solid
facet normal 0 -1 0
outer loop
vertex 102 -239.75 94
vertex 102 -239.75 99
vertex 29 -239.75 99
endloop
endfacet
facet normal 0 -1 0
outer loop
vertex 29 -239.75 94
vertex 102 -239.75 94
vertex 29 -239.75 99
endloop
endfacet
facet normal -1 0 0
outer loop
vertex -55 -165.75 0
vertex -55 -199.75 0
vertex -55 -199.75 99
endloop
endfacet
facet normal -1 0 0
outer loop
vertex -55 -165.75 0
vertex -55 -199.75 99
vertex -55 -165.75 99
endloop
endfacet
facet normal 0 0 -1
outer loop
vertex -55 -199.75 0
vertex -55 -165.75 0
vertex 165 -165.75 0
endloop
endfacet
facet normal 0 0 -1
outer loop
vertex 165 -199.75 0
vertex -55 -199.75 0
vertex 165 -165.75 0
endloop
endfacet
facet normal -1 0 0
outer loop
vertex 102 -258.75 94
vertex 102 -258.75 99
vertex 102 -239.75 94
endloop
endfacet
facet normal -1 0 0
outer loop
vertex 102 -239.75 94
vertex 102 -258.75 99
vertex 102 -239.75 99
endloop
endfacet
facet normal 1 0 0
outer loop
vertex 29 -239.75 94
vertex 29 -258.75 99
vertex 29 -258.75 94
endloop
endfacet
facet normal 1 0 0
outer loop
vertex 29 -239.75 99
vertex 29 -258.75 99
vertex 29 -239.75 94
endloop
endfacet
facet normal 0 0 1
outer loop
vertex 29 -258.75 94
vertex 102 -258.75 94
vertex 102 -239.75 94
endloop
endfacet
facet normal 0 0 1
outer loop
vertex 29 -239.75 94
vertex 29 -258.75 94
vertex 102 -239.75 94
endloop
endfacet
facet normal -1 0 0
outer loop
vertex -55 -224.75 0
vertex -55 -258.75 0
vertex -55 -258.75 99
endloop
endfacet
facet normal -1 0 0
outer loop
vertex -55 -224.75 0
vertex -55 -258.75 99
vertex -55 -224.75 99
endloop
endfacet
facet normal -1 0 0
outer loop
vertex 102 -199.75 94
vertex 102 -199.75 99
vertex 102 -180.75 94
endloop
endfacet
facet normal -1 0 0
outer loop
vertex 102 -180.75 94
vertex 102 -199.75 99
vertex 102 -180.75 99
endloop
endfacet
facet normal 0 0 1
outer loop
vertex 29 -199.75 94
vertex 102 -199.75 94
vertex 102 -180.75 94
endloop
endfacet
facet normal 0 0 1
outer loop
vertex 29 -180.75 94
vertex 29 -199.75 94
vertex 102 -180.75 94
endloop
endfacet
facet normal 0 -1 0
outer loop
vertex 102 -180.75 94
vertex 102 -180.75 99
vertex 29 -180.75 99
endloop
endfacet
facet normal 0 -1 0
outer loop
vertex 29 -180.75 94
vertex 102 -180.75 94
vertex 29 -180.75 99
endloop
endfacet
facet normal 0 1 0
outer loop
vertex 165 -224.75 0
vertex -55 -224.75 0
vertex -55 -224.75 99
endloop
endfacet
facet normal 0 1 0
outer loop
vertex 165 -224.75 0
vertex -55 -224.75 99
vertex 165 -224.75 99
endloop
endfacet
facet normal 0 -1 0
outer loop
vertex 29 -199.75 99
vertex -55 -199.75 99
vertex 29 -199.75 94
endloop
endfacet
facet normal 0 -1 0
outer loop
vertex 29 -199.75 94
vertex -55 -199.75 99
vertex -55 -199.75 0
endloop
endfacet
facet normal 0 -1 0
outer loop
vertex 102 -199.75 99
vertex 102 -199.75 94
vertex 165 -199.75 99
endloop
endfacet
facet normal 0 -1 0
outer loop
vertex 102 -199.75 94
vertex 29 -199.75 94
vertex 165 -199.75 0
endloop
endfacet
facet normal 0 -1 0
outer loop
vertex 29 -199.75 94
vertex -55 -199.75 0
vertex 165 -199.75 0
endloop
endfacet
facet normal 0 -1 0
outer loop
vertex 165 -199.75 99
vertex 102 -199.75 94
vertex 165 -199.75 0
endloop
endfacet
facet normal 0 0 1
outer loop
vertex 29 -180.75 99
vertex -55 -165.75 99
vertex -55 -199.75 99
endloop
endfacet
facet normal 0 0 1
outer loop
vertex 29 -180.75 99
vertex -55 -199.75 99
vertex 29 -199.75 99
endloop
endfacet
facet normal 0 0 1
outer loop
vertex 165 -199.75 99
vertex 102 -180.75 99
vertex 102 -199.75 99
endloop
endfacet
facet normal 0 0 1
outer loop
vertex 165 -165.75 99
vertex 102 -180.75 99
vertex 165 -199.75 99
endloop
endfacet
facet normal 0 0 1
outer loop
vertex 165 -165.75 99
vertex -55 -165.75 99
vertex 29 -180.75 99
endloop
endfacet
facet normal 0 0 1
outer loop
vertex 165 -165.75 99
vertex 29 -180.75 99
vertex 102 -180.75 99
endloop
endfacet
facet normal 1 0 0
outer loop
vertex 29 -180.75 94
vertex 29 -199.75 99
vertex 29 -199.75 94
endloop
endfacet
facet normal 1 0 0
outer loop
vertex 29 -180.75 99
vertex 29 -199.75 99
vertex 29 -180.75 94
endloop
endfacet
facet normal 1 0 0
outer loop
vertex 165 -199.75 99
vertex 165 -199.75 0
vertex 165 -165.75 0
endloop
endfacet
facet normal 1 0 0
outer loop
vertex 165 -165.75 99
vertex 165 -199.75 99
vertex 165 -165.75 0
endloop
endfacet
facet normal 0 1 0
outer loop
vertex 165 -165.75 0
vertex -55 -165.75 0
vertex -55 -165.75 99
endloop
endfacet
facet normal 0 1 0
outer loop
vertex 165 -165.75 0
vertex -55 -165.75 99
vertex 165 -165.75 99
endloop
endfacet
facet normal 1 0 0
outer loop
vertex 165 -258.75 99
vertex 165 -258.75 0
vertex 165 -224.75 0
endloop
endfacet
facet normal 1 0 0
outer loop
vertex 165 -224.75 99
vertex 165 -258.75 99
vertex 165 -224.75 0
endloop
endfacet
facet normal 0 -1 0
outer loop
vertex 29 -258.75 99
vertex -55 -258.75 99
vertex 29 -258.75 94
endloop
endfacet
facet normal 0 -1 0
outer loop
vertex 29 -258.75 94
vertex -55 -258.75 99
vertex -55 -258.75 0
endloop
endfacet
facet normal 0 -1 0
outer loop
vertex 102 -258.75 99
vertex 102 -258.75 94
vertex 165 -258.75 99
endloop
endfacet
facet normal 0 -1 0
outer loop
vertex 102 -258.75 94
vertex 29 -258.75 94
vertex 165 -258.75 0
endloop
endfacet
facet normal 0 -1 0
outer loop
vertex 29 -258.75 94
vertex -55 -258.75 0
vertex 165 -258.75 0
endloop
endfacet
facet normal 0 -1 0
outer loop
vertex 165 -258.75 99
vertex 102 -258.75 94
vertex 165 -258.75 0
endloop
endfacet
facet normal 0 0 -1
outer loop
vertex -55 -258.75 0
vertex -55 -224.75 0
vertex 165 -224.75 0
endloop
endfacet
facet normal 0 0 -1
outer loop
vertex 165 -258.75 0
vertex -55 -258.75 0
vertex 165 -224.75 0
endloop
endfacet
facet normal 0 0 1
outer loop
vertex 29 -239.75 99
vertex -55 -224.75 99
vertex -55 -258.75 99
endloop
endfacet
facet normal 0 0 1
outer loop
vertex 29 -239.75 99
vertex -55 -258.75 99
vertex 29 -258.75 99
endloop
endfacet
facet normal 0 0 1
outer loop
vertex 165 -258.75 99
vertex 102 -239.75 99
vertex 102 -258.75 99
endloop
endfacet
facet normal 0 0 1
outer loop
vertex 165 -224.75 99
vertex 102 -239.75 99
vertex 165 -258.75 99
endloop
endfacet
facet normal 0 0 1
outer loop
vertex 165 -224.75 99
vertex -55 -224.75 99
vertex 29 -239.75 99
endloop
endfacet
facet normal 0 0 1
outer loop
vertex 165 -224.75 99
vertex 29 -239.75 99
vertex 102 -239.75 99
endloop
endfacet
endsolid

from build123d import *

# Parameters (mm, degrees)
SKETCH001005015_W = 19
SKETCH001005015_H = 73
EXTRUDE013_DEPTH  = 5
SKETCH001005004_W = 220
SKETCH001005004_H = 34
EXTRUDE012_DEPTH  = 99


with BuildPart() as con_holes:
    # Sketch001005015 (on Face12 of Extrude012) → Extrude013 (new body)
    with BuildSketch(Plane(origin=(55, -212.25, 99), x_dir=(0, 1, 0), z_dir=(0, 0, 1))):
        with Locations((22, -10.5)):
            Rectangle(SKETCH001005015_W, SKETCH001005015_H)
        with Locations((-37, -10.5)):
            Rectangle(SKETCH001005015_W, SKETCH001005015_H)
    extrude(amount=-EXTRUDE013_DEPTH)


with BuildPart() as gpus:
    # Sketch001005004 → Extrude012 (new body)
    with BuildSketch(Plane.XY):
        with Locations((55, -182.75)):
            Rectangle(SKETCH001005004_W, SKETCH001005004_H)
        with Locations((55, -241.75)):
            Rectangle(SKETCH001005004_W, SKETCH001005004_H)
    extrude(amount=EXTRUDE012_DEPTH)

    # Cut002: cut Con-Holes
    add(con_holes.part, mode=Mode.SUBTRACT)


solid = gpus.part
